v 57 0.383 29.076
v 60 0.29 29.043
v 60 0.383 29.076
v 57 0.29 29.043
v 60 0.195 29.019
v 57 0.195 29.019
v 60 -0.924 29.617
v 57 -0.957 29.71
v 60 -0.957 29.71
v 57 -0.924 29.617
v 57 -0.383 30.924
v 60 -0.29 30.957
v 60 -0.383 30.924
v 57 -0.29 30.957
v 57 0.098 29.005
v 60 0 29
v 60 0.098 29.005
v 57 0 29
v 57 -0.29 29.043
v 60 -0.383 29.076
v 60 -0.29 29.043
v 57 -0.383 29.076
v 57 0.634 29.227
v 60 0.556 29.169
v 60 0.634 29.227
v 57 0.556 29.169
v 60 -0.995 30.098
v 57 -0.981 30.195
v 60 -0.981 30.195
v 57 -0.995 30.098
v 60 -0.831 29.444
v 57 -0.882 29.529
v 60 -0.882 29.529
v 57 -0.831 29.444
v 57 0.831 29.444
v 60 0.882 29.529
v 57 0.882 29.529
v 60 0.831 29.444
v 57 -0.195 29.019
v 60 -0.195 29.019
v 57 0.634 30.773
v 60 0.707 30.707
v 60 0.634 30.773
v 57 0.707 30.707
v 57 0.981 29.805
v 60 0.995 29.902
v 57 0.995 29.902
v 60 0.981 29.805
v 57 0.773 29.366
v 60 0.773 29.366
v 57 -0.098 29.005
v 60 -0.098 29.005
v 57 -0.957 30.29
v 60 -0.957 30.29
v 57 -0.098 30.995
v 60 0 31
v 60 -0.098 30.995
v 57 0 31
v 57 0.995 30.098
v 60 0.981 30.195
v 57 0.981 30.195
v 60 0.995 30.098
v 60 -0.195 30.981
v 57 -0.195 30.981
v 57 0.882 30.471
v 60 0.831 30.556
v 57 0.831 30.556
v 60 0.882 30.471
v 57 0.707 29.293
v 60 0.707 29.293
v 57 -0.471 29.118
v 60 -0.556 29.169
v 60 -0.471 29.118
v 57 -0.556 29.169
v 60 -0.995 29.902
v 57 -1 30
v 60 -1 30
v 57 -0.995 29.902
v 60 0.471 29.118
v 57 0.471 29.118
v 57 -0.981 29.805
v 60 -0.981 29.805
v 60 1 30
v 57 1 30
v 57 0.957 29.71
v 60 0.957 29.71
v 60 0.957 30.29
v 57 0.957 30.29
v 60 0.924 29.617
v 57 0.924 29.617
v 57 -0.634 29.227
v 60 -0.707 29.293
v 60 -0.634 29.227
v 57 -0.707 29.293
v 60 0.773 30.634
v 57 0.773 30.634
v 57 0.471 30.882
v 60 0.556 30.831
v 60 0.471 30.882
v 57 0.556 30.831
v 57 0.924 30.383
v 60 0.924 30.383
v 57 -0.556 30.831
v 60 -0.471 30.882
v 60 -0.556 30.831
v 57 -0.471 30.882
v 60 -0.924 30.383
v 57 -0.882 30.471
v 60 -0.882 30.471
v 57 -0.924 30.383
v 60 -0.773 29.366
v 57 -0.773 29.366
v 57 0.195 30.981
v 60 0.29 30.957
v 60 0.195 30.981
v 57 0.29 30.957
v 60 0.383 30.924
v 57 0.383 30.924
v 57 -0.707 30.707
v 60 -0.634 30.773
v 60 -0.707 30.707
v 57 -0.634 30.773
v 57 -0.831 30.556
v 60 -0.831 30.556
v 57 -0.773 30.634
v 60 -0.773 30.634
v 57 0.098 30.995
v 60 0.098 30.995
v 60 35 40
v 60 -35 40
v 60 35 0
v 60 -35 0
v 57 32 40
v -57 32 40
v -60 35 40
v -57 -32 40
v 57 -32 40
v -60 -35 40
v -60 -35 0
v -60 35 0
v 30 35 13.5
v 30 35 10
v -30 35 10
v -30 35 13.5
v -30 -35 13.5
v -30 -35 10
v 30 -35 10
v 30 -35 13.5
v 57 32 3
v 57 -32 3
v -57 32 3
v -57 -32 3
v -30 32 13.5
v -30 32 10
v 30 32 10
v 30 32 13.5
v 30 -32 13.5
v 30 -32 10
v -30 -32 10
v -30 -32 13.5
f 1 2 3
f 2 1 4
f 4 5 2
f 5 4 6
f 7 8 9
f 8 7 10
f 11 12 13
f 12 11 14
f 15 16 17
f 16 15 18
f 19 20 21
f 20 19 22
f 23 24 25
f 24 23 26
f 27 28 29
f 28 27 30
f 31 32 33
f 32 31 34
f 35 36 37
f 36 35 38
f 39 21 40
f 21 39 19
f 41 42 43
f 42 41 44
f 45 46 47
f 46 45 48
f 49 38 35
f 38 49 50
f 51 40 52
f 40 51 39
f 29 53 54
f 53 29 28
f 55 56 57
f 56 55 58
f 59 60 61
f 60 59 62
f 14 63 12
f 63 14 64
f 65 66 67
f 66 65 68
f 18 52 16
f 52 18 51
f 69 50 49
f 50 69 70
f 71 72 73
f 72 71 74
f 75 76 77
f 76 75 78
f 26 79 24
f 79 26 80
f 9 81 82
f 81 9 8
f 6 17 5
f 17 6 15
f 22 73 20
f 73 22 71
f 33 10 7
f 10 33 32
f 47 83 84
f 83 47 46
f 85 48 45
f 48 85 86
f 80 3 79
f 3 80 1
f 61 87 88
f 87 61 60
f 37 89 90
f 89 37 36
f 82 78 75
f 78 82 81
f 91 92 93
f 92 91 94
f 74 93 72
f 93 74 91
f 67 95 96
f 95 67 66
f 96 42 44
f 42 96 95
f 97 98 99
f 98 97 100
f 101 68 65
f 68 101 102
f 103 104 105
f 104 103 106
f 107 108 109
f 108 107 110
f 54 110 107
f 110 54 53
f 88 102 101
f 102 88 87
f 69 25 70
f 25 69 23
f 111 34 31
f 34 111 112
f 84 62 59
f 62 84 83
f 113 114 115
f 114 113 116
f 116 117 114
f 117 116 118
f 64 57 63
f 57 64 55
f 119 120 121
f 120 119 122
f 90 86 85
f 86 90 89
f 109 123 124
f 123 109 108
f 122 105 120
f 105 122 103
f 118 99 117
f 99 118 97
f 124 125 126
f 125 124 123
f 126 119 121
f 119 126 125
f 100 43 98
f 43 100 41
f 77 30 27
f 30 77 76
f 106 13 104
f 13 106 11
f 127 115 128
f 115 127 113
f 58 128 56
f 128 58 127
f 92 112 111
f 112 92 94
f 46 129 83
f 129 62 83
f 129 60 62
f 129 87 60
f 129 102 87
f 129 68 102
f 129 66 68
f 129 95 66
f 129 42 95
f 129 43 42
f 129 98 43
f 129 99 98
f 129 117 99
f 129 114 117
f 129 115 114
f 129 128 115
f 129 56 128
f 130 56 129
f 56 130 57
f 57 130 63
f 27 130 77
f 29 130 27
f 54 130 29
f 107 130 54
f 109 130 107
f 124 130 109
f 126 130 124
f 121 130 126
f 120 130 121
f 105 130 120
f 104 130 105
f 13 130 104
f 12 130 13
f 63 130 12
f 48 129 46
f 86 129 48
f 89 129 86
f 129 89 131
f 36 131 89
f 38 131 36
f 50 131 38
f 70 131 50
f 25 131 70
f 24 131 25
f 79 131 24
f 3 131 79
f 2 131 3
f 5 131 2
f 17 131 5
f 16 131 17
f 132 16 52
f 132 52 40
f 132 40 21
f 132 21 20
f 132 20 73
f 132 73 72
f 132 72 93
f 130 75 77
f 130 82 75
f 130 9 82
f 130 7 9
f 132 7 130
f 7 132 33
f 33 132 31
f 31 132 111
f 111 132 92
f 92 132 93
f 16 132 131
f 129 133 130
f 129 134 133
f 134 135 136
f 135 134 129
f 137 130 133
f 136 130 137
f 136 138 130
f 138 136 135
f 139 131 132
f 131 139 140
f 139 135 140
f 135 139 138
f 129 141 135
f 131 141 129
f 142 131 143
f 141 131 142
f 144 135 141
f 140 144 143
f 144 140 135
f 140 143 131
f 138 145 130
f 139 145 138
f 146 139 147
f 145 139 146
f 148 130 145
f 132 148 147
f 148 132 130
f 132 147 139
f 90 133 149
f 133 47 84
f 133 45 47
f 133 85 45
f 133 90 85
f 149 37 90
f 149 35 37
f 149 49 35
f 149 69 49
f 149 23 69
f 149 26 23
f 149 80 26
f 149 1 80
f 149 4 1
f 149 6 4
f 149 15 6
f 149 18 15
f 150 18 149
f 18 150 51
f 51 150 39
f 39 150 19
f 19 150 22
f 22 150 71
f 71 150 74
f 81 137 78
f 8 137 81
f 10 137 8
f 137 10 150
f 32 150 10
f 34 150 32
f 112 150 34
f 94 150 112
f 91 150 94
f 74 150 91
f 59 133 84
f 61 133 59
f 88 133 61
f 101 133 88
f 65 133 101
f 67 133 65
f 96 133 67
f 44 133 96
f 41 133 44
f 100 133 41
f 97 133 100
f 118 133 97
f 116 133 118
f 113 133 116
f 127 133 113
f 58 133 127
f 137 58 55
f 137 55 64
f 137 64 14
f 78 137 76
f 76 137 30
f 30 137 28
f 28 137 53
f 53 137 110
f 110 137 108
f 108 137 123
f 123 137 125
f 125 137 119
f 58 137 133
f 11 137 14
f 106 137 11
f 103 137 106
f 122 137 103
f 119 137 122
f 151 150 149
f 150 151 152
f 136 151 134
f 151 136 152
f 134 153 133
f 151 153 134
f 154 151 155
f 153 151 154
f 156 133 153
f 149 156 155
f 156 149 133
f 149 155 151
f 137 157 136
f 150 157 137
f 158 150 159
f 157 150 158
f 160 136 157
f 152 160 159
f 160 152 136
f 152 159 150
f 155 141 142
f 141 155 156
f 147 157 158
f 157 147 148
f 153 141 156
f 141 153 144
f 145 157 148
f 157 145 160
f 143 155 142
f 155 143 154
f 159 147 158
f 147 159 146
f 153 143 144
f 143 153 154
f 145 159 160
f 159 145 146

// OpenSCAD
// Mini horizontal gel-electrophoresis box - buffer tank
// Print orientation: tank rests on XY plane at z = 0, open top.

$fn = 64;

// ---- Tank dimensions ----
tank_x = 120;   // outer length (X)
tank_y = 70;    // outer width (Y)
tank_z = 40;    // outer height (Z)

// ---- Wall thicknesses ----
wall = 3;       // side wall thickness
floor = 3;      // floor thickness

// ---- Raised platform (gel tray support) ----
plat_x = 60;    // platform length in X (centred)
plat_y = tank_y; // platform spans full inner width
plat_top_z = 13; // platform top height above inner floor

// ---- Electrode holes ----
hole_d = 2;     // hole diameter
hole_y = 0;     // hole Y position
hole_z = 30;    // hole Z position

// ---- Cutting overshoot ----
eps = 0.5;      // extension past cut faces

// ---- Derived ----
inner_x = tank_x - 2 * wall;
inner_y = tank_y - 2 * wall;
inner_floor_z = floor;
plat_bot_z = plat_top_z - wall; // platform sits on side walls

difference() {
    // Main tank body
    translate([-tank_x / 2, -tank_y / 2, 0])
        cube([tank_x, tank_y, tank_z]);

    // Open top (no lid)
    translate([-inner_x / 2, -inner_y / 2, inner_floor_z])
        cube([inner_x, inner_y, tank_z - inner_floor_z + eps]);

    // Central raised platform
    translate([-plat_x / 2, -plat_y / 2, plat_bot_z])
        cube([plat_x, plat_y, plat_top_z - plat_bot_z + eps]);

    // Horizontal electrode holes through end walls
    for (sx = [-1, 1])
        translate([sx * (inner_x / 2 - hole_d / 2), hole_y, hole_z])
            rotate([0, 90, 0])
                cylinder(d = hole_d, h = inner_x + 2 * eps);
}
